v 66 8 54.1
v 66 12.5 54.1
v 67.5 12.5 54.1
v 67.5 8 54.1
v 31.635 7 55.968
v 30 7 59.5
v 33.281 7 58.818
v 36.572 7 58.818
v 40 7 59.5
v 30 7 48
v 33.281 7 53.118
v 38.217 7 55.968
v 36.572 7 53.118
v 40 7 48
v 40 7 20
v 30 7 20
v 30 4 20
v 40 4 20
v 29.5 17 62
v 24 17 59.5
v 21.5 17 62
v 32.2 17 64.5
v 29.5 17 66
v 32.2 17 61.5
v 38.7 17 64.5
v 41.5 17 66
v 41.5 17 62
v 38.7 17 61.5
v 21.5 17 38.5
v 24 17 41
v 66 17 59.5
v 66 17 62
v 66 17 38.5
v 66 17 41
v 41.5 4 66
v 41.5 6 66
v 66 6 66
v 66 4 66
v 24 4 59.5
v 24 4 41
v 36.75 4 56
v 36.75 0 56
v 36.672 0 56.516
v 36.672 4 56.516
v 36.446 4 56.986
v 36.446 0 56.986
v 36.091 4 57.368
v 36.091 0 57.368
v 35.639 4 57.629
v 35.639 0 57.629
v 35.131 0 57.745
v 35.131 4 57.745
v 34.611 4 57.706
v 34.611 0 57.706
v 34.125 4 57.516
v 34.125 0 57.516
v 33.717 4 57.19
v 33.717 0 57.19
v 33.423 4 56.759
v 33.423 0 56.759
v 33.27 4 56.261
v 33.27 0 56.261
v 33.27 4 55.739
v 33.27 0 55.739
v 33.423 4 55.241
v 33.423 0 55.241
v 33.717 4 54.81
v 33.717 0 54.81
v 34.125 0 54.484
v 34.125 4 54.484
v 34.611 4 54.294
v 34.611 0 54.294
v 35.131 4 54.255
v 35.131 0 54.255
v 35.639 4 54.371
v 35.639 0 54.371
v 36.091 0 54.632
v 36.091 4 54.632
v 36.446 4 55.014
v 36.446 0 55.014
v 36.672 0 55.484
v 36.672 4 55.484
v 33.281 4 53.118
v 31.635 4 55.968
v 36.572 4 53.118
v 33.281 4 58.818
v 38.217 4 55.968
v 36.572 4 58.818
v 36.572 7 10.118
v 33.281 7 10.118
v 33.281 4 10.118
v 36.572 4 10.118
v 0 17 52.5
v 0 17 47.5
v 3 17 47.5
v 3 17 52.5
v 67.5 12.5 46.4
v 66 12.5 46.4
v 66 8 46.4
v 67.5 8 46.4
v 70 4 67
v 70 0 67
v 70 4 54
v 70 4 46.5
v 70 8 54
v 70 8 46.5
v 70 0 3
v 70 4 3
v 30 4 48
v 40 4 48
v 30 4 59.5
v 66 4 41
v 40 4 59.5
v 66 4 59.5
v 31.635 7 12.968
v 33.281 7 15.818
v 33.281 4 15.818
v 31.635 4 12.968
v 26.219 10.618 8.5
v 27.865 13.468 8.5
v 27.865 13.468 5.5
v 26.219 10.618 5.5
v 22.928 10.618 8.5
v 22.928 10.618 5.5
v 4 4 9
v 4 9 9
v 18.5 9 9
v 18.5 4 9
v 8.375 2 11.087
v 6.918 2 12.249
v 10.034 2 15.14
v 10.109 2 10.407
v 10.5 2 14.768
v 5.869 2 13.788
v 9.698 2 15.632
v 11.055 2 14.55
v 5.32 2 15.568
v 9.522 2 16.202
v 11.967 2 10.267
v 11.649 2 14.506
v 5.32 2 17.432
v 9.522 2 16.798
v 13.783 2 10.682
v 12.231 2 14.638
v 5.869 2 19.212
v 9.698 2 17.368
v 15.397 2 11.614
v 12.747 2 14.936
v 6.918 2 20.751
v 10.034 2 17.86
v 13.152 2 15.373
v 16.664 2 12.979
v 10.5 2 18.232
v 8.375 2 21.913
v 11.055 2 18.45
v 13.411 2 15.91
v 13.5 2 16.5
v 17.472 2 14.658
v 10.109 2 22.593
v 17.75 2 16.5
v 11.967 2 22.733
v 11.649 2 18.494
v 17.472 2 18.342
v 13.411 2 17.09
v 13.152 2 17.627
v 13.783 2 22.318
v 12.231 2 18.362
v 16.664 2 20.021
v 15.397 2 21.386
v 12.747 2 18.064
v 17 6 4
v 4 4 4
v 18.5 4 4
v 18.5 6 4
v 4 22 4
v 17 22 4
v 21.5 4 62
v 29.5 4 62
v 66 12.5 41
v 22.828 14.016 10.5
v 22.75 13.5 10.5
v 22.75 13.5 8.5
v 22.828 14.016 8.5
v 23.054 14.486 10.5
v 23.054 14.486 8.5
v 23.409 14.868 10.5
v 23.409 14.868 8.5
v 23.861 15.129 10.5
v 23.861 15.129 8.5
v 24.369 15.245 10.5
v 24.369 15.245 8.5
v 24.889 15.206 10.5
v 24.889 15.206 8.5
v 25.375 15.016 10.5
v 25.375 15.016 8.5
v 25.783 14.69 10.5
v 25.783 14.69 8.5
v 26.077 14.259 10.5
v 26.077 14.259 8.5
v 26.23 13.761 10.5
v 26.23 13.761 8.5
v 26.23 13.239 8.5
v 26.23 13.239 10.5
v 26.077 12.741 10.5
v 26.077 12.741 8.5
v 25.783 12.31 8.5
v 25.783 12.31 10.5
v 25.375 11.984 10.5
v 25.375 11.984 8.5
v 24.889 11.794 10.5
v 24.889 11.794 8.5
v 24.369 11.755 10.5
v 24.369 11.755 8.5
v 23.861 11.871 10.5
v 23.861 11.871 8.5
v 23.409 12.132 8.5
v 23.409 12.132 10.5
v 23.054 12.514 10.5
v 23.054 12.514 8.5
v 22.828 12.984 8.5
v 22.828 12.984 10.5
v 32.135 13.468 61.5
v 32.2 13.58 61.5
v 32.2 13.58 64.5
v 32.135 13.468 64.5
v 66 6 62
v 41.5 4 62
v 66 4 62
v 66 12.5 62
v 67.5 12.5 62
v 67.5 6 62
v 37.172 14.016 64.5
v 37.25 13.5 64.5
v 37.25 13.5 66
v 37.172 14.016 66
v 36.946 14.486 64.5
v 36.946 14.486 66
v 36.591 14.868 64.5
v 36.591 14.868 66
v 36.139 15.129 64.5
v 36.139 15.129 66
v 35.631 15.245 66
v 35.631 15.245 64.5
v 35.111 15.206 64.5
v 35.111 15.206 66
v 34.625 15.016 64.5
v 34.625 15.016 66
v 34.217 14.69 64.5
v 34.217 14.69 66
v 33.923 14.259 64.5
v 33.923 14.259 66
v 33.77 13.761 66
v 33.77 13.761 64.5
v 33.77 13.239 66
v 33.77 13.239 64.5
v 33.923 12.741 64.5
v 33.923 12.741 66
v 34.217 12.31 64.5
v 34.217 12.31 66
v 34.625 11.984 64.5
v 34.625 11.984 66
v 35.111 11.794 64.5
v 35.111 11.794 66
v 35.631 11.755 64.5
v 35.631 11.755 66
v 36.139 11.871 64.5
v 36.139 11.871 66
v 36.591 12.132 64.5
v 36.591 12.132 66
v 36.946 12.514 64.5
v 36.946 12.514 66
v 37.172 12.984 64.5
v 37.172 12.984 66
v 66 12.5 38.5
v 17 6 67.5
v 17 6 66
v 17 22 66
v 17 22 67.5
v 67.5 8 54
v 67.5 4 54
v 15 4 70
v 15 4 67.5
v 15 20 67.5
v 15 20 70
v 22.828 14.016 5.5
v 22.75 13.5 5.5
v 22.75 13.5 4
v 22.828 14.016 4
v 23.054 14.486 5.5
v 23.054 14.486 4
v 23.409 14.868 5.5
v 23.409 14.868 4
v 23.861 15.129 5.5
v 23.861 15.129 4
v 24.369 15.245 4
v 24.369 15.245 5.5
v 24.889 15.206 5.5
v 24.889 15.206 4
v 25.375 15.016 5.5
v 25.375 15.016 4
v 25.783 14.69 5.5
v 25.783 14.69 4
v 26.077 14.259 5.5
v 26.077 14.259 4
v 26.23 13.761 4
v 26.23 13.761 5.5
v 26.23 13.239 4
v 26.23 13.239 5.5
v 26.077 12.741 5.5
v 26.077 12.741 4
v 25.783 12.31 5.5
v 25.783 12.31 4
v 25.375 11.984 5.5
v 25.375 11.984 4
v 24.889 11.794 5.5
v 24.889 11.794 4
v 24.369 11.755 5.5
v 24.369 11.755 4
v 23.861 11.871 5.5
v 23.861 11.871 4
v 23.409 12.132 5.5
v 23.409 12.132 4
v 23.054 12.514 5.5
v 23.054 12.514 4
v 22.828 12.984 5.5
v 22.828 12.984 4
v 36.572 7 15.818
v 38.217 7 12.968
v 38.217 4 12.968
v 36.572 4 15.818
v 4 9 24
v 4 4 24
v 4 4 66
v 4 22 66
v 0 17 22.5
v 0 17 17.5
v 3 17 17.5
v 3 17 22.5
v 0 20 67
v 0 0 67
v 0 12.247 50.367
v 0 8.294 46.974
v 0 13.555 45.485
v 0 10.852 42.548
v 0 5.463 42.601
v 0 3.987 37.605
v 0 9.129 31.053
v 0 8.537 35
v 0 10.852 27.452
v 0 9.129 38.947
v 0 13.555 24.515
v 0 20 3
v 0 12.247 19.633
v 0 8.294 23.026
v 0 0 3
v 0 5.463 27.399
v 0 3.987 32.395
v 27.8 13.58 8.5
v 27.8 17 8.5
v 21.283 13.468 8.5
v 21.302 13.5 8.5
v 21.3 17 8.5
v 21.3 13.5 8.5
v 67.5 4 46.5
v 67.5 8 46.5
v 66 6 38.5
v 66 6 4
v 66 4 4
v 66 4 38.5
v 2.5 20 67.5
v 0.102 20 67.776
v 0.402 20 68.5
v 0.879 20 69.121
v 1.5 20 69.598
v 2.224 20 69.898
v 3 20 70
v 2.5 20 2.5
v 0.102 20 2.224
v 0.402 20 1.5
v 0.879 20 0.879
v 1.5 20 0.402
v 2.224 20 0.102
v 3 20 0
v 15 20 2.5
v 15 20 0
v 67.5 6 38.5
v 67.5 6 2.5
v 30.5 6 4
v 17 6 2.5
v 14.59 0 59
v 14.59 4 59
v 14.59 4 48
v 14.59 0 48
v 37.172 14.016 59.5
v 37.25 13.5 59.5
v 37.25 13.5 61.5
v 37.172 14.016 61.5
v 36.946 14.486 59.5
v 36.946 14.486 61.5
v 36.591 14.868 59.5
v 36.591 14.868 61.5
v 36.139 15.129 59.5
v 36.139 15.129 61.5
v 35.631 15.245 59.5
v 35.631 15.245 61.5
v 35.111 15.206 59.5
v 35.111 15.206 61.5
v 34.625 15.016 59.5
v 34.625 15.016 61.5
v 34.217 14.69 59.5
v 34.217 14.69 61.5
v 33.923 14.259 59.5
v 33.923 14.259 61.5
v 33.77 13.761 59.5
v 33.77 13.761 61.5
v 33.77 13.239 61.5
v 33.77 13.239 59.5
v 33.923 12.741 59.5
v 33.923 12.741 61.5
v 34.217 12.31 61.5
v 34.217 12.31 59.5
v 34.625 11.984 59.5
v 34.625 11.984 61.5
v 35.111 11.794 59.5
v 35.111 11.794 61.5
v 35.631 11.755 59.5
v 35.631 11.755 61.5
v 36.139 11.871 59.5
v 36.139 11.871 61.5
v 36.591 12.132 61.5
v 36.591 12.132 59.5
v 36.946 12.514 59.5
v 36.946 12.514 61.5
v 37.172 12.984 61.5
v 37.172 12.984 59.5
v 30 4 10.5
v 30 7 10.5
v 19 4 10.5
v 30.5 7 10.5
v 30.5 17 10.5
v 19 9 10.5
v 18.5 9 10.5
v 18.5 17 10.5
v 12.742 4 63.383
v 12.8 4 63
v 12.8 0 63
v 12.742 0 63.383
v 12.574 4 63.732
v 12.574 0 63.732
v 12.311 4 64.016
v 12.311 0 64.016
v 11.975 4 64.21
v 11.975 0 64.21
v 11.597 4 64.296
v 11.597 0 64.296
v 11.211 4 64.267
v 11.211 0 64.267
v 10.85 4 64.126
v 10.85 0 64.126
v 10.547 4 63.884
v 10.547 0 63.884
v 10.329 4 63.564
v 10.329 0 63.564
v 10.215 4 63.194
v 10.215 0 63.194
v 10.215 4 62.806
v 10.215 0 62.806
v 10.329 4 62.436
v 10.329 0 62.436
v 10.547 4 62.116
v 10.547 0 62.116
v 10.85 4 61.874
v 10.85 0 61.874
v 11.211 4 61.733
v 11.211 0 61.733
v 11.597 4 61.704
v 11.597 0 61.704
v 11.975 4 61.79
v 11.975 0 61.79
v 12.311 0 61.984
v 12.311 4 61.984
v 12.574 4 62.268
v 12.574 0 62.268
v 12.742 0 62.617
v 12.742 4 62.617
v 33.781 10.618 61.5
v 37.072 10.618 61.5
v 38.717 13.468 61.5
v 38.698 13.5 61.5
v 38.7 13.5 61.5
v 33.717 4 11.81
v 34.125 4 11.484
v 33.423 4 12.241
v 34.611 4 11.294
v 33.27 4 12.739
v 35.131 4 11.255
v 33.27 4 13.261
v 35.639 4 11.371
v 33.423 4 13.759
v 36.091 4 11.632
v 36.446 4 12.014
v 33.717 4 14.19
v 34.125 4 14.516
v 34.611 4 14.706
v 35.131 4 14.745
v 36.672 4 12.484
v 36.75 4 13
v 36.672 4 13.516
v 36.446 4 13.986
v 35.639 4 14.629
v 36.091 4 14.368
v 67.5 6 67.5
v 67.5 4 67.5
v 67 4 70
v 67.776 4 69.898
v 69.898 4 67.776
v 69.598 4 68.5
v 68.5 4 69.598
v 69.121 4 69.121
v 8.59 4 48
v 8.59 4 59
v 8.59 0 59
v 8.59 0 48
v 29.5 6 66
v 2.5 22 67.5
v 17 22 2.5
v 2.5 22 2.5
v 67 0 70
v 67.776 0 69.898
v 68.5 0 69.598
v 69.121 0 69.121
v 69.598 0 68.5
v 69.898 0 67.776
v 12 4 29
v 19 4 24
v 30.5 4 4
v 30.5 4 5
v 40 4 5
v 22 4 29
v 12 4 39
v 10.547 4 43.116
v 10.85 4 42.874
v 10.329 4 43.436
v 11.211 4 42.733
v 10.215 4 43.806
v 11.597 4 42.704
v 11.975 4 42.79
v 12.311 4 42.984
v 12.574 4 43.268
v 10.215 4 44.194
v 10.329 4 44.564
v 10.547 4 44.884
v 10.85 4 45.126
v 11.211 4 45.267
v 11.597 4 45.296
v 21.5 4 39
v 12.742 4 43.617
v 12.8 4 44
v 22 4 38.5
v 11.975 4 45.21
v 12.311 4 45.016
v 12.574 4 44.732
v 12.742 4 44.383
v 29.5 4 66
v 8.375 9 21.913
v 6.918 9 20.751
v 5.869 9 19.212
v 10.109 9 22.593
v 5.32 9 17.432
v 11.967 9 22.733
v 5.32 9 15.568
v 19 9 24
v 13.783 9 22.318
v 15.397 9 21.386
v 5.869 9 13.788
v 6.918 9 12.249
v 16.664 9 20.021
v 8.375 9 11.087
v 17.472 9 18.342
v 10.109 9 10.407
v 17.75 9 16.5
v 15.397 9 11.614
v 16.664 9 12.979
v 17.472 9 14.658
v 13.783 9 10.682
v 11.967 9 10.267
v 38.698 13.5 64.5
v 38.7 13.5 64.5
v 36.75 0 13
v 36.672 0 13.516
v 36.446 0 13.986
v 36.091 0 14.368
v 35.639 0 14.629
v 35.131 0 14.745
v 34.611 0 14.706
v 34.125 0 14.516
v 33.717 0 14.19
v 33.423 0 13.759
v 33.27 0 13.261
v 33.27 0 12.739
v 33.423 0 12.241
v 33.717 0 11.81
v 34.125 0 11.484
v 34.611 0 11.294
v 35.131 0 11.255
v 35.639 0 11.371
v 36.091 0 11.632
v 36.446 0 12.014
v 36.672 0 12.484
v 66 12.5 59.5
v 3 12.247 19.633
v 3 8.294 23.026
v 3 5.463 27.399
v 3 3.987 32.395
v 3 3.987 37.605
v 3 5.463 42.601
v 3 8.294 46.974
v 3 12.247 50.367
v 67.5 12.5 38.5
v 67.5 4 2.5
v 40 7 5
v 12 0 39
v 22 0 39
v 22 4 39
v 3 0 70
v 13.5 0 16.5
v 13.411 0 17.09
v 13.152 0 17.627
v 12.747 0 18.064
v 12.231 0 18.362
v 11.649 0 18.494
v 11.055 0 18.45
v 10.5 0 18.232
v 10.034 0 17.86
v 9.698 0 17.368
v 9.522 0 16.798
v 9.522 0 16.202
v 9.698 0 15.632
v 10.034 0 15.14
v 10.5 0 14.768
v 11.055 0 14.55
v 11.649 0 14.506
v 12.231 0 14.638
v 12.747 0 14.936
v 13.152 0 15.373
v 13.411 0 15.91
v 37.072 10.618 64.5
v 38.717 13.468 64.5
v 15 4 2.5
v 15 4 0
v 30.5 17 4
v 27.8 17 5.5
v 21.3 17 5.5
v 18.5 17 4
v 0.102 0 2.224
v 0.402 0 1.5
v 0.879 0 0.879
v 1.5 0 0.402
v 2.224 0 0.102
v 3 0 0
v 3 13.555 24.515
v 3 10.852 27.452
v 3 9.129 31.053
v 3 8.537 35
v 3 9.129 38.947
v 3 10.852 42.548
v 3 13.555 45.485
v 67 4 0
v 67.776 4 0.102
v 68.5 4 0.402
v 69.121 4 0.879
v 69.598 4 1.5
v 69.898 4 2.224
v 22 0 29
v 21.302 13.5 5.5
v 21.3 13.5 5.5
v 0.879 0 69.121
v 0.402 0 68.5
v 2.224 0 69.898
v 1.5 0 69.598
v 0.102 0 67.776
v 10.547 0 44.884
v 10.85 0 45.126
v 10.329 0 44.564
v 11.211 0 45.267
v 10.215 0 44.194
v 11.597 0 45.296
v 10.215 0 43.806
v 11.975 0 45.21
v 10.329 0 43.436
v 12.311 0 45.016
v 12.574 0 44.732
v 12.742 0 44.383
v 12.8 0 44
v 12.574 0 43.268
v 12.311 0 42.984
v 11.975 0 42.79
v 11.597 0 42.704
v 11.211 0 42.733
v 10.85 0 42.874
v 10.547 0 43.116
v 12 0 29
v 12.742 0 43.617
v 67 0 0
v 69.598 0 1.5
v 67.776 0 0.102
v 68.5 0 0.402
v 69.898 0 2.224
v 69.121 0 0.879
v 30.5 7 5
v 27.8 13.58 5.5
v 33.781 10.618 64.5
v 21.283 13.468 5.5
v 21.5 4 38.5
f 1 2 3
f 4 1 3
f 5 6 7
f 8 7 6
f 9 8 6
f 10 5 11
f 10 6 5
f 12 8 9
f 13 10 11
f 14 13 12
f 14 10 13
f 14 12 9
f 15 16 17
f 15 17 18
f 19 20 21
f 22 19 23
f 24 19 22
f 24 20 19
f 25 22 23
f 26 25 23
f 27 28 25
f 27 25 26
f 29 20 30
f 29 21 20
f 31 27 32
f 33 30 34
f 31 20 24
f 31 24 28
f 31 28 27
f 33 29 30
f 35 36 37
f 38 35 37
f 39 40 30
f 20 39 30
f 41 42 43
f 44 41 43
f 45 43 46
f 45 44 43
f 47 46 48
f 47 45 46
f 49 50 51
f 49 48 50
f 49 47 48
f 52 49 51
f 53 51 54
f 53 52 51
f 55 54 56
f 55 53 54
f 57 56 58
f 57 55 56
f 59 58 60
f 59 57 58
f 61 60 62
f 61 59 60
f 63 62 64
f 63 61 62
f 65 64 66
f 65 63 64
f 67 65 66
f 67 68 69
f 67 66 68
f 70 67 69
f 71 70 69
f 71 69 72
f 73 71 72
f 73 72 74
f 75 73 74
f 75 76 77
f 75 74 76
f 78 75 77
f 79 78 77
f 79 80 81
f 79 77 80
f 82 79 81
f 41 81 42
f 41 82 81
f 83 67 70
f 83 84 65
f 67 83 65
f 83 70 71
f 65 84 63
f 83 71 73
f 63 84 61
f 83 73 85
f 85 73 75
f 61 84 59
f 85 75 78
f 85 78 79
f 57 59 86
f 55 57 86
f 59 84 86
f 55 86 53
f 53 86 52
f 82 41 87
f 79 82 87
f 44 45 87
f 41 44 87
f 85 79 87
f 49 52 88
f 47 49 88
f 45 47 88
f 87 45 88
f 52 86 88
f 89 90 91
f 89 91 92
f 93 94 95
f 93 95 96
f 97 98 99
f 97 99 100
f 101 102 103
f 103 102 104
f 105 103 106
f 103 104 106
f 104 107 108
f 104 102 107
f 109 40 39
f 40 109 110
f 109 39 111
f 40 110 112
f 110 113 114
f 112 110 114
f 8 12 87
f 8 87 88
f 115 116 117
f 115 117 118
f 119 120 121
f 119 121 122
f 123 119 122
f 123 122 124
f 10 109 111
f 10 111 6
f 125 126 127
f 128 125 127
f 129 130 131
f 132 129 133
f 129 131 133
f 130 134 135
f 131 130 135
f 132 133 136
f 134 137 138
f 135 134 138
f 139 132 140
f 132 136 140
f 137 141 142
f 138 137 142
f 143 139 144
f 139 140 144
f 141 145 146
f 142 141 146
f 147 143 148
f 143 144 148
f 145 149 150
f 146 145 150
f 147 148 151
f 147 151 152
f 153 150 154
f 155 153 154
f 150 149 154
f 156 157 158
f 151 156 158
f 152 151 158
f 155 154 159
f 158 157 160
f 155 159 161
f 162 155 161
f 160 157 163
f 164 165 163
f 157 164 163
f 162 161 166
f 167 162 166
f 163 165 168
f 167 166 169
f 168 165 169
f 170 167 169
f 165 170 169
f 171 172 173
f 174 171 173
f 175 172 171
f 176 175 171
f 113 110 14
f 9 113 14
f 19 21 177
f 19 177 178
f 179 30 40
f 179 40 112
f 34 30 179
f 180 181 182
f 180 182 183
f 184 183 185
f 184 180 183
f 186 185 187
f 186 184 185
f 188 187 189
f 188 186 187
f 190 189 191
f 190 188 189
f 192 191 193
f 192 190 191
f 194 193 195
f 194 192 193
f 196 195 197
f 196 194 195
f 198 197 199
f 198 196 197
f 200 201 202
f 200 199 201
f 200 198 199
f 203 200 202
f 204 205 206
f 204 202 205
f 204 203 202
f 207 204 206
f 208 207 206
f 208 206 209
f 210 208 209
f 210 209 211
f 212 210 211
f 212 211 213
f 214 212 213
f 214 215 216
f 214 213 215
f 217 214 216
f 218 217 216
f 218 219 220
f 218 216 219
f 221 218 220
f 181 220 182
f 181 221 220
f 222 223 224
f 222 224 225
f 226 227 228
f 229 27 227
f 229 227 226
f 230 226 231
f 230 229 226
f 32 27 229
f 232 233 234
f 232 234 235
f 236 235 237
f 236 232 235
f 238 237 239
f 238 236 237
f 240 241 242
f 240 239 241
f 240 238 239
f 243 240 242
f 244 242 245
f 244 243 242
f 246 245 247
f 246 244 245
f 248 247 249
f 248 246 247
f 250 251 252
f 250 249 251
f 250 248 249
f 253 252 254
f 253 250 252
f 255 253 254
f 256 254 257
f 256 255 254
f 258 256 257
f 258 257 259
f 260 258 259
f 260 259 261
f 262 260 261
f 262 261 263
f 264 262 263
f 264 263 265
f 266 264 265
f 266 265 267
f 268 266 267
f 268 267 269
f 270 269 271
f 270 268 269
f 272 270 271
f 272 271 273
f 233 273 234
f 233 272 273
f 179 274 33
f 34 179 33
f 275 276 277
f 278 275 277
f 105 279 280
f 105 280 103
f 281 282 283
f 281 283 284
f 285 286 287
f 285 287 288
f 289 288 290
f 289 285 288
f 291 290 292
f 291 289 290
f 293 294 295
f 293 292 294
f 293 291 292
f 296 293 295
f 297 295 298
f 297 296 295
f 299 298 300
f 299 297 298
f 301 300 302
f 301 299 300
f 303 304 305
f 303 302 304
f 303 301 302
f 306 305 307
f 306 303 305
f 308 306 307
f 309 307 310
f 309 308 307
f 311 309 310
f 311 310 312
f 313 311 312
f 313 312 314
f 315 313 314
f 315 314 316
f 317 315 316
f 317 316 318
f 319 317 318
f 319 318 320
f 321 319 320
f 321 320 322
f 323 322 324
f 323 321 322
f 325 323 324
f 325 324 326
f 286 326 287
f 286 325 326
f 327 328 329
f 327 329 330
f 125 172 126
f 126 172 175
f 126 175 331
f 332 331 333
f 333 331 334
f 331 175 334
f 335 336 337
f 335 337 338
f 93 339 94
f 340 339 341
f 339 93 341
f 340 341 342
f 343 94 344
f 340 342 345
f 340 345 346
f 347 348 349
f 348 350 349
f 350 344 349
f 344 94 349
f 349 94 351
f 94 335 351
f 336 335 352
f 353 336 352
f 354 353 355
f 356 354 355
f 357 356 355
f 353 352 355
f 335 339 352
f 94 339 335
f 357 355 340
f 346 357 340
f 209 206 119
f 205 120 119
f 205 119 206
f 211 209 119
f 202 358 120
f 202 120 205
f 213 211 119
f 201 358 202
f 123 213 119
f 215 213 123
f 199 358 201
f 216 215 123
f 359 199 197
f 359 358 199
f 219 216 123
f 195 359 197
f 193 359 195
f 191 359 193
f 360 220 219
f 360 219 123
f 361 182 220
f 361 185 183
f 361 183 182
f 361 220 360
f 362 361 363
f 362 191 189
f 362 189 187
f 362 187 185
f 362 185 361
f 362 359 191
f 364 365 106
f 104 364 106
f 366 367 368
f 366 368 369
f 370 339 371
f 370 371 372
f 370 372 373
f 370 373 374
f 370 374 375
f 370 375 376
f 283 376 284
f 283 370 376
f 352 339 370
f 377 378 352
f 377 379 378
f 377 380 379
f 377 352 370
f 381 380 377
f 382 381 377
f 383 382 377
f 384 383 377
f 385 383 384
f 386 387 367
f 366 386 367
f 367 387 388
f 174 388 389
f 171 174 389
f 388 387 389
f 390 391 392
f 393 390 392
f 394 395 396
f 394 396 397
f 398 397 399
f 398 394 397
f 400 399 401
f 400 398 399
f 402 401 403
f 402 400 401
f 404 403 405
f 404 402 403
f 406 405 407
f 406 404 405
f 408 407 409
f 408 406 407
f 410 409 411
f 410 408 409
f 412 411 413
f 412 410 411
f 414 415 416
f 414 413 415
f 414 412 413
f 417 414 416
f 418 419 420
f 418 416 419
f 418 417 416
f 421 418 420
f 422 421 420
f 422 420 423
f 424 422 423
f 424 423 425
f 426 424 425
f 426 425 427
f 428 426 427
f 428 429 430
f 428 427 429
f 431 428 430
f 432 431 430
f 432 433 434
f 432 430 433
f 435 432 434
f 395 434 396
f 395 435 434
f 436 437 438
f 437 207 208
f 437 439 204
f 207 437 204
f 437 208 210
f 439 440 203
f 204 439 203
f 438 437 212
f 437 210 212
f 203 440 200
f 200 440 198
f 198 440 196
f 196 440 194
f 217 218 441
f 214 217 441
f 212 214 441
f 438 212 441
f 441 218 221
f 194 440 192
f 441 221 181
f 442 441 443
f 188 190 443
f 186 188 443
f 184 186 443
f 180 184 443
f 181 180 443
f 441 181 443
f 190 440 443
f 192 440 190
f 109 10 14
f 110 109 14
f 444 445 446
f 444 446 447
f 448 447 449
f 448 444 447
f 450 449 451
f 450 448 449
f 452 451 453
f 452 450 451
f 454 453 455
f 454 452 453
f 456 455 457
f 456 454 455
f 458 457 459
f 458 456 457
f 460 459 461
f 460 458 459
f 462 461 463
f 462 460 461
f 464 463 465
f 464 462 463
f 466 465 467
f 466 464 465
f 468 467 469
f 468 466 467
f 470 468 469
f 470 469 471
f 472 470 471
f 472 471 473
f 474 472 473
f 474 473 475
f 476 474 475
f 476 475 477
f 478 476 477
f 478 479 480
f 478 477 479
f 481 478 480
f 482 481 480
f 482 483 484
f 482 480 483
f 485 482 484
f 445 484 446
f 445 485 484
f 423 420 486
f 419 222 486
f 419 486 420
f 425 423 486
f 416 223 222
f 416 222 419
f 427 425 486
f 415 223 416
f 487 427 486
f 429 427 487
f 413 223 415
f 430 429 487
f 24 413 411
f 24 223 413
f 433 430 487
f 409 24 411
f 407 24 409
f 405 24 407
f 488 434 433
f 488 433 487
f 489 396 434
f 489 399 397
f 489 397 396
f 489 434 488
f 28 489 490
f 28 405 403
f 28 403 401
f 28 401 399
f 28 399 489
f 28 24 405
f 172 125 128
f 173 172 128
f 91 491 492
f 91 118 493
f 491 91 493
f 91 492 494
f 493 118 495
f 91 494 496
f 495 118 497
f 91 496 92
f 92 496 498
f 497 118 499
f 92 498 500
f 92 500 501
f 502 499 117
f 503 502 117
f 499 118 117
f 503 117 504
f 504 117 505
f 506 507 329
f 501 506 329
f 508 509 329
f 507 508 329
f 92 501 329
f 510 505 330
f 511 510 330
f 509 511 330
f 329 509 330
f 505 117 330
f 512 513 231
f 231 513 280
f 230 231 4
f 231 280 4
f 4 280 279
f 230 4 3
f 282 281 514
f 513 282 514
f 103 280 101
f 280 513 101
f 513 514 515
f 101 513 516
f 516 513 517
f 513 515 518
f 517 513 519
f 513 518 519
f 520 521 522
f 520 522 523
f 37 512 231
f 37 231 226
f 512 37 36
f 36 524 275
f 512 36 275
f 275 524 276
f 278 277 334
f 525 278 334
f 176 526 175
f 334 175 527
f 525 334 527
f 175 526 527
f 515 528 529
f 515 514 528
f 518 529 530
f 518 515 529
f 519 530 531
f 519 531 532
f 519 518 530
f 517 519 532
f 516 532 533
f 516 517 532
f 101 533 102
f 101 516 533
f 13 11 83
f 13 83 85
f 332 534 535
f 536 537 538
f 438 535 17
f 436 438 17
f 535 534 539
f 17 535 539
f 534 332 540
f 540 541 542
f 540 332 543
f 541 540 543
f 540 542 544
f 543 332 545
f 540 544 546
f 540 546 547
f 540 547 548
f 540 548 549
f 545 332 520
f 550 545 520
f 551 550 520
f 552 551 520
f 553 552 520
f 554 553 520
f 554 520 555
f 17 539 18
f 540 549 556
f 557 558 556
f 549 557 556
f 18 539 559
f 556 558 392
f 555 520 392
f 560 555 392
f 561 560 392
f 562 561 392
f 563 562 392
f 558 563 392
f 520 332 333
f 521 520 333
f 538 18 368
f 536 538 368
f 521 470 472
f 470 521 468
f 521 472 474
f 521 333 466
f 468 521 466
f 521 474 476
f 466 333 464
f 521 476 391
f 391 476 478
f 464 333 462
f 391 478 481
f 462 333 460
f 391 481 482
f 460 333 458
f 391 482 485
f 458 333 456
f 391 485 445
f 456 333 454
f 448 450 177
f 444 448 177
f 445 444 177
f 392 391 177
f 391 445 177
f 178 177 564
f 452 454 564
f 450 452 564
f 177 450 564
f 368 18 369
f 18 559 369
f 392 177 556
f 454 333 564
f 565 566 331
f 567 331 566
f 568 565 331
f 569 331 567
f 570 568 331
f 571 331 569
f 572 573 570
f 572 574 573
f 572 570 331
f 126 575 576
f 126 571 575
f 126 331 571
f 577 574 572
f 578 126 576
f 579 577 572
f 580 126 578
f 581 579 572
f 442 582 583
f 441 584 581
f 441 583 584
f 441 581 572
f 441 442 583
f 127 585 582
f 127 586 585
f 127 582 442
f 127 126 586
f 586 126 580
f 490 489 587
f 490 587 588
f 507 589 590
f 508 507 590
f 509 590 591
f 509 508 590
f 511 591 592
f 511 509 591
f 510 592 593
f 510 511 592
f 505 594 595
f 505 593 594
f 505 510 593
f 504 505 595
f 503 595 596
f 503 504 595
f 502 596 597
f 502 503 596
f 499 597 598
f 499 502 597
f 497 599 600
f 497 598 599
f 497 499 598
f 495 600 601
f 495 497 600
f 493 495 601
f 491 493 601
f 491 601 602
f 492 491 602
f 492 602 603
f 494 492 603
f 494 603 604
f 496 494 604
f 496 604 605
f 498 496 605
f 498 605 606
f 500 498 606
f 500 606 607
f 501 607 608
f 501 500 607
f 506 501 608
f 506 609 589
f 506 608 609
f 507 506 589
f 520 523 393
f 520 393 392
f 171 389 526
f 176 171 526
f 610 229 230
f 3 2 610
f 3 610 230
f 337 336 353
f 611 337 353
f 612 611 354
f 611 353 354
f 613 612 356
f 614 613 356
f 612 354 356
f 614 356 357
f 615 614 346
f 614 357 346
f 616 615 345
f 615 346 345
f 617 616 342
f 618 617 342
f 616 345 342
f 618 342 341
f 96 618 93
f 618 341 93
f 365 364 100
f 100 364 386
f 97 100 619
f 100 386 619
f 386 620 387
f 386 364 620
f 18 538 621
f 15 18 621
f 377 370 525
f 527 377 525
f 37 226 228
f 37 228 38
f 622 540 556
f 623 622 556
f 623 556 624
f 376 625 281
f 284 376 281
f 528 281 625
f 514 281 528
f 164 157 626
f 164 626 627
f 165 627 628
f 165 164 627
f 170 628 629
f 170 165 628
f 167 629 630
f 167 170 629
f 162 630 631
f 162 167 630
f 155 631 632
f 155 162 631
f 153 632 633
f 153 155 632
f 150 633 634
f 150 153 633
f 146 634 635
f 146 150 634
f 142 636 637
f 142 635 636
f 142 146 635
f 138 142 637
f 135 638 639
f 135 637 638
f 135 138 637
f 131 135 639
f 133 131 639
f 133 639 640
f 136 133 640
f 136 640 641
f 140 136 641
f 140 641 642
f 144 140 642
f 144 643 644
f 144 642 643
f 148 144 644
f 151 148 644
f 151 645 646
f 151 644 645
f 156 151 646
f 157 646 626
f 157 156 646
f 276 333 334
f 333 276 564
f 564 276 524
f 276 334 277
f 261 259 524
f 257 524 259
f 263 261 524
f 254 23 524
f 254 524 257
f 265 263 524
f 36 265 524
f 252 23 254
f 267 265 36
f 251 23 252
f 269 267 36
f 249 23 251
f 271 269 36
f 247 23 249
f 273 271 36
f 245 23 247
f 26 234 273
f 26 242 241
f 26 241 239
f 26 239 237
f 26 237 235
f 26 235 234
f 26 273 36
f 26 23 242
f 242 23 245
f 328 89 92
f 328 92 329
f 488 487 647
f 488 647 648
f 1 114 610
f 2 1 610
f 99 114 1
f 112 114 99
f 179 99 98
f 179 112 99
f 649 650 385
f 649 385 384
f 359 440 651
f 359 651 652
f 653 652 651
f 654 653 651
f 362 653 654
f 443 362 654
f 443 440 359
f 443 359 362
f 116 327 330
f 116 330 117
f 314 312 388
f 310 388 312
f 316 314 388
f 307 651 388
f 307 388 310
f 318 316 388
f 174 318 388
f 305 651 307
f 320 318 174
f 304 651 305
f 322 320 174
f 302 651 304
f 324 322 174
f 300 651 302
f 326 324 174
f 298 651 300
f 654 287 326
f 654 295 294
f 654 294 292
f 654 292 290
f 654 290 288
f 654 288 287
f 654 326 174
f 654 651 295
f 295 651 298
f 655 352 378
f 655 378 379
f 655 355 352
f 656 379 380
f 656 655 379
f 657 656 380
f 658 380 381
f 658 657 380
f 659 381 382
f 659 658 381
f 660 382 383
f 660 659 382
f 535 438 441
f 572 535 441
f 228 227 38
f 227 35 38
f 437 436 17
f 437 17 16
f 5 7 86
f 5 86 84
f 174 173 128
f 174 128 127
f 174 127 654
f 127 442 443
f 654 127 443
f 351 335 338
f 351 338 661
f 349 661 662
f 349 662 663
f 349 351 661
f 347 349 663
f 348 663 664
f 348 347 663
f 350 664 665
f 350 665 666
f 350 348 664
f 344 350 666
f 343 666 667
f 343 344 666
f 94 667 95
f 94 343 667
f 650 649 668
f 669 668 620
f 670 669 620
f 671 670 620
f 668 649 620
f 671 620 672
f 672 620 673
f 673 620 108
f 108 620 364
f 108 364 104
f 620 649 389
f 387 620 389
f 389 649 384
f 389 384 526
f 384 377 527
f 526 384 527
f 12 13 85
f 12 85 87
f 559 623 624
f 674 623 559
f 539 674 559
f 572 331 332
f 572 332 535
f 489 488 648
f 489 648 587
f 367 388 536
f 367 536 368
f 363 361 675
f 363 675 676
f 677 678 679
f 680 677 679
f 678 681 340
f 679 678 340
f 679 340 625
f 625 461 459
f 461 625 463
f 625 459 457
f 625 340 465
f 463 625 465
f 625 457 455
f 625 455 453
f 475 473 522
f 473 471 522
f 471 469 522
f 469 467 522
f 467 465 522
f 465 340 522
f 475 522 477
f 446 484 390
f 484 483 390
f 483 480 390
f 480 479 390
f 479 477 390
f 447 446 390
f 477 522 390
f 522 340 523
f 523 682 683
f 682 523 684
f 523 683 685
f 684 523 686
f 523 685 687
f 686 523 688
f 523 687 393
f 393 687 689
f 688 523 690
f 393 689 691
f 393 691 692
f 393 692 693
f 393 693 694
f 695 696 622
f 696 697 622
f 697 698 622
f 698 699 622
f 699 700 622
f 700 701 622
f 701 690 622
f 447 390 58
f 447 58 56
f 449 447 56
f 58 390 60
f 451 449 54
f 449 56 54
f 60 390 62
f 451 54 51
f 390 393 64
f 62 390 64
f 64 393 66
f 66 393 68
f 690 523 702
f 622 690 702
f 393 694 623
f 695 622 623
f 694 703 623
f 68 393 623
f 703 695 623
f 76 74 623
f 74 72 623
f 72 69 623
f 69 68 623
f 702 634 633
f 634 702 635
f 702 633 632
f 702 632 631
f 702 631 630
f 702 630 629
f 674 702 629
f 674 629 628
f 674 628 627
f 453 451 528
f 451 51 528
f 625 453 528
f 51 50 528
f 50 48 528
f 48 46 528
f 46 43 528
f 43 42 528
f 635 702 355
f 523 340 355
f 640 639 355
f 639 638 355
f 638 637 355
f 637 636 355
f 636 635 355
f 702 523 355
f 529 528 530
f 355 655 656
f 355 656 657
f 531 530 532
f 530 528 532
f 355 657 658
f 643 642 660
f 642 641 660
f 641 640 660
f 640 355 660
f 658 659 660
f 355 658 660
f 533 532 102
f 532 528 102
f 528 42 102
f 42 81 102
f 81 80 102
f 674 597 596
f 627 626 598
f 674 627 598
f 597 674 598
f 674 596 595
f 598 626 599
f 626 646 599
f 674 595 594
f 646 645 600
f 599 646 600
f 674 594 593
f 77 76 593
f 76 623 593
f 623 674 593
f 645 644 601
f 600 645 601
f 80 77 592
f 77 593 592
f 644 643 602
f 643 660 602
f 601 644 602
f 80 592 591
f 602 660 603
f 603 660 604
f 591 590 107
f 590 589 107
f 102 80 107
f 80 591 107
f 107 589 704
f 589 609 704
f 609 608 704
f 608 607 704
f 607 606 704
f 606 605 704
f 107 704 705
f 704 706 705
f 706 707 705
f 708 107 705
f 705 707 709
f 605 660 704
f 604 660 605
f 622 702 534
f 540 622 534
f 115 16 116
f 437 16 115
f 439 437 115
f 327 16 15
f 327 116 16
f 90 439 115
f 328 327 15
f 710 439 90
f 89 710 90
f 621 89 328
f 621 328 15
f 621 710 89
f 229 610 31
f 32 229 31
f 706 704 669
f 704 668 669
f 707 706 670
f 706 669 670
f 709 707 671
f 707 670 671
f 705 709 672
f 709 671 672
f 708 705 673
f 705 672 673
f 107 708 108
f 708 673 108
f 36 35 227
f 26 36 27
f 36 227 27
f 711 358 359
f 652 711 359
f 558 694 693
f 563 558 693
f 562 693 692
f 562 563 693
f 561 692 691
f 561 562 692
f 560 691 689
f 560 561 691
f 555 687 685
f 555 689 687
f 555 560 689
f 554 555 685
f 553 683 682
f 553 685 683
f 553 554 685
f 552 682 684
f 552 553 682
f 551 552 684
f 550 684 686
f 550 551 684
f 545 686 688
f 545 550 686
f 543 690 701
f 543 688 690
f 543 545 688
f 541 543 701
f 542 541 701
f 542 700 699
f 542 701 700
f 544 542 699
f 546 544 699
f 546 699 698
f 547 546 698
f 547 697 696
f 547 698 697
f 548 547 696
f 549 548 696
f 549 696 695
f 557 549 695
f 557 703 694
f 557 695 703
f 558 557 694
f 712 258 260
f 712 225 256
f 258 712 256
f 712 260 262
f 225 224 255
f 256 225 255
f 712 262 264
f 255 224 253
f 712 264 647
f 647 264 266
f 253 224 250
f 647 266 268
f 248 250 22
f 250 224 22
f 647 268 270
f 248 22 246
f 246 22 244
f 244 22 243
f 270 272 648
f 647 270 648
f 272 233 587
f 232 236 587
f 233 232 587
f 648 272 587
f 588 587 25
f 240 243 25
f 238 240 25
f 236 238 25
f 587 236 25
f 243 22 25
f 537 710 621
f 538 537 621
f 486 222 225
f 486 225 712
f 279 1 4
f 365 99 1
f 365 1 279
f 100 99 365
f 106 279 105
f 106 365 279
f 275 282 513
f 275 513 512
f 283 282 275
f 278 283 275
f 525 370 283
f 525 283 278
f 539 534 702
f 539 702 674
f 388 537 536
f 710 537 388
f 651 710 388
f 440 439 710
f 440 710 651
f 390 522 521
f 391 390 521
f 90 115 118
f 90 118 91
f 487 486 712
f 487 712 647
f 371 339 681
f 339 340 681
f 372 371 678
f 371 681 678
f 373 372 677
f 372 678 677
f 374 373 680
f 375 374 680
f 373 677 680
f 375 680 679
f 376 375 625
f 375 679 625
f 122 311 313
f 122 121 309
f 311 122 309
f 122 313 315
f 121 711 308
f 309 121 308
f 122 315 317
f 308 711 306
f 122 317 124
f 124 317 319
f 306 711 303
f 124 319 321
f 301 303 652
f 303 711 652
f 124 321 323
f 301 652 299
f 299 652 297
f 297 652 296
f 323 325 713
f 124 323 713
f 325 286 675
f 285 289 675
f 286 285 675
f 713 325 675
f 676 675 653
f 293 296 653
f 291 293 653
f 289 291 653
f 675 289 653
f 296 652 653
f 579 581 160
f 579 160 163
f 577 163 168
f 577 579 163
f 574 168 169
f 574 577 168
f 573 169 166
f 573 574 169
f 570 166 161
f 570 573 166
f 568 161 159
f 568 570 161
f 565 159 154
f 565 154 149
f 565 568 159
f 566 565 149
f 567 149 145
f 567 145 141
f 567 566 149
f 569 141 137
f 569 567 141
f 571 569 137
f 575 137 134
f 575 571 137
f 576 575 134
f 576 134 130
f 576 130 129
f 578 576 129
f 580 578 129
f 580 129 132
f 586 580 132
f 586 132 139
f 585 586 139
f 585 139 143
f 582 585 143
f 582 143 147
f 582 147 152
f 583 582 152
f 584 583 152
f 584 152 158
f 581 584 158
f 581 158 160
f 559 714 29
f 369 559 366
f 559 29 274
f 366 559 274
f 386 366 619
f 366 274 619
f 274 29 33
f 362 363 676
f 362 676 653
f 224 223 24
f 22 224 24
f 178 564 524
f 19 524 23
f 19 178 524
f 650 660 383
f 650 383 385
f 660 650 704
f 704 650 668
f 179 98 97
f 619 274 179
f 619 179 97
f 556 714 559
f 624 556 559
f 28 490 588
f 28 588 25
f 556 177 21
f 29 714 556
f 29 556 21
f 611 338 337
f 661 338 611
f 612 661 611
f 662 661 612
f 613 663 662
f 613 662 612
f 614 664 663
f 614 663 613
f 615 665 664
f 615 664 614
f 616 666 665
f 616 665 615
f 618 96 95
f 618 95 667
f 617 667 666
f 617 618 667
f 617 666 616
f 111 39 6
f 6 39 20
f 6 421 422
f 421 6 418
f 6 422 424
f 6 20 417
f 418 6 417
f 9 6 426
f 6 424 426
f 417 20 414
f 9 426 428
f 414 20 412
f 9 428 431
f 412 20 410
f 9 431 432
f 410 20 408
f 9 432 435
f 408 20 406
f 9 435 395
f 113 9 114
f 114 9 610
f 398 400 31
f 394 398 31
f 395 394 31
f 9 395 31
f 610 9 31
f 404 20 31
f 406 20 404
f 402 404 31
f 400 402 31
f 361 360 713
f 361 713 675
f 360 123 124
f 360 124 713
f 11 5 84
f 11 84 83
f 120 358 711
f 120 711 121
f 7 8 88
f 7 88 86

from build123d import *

# Parameters (mm, degrees)
BOX071_W               = 10
BOX071_H               = 4.5
BOX071_DEPTH           = 7.7
BOX070_W               = 1.5
BOX070_H               = 6.5
BOX070_DEPTH           = 23.5
BOX072_W               = 2.5
BOX072_H               = 4
BOX072_DEPTH           = 7.5
CYLINDER040_R          = 1.3
CYLINDER040_DEPTH      = 10
CYLINDER040_ROLL_ANGLE = 90
CYLINDER039_R          = 1.3
CYLINDER039_DEPTH      = 10
CYLINDER039_ROLL_ANGLE = 90
BOX068_W               = 11
BOX068_H               = 10
BOX068_DEPTH           = 6
BOX068_PITCH_ANGLE     = 90
CYLINDER037_R          = 6.25
CYLINDER037_DEPTH      = 10
CYLINDER037_ROLL_ANGLE = 90
CYLINDER038_R          = 2
CYLINDER038_DEPTH      = 10
CYLINDER038_ROLL_ANGLE = 90
BOX059_W               = 2.5
BOX059_H               = 13
BOX059_DEPTH           = 23.5
BOX060_W               = 44
BOX060_H               = 13
BOX060_DEPTH           = 2.5
BOX061_W               = 7.5
BOX061_H               = 13
BOX061_DEPTH           = 2.5
BOX062_W               = 24.5
BOX062_H               = 13
BOX062_DEPTH           = 2.5
BOX056_W               = 10
BOX056_H               = 20
BOX056_DEPTH           = 10
CYLINDER032_R          = 1.75
CYLINDER032_DEPTH      = 10
BOX055_W               = 6.5
BOX055_H               = 10
BOX055_DEPTH           = 3
PAD011_DEPTH           = 3
BOX053_W               = 12
BOX053_H               = 13
BOX053_DEPTH           = 6.5
CUT068_PLACEMENT_ANGLE = 180
CYLINDER019_R          = 1.75
CYLINDER019_DEPTH      = 20
CYLINDER019_ROLL_ANGLE = 90
CYLINDER020_R          = 1.75
CYLINDER020_DEPTH      = 20
CYLINDER020_ROLL_ANGLE = 90
BOX019_W               = 2.5
BOX019_H               = 2
BOX019_DEPTH           = 12.5
BOX019_PITCH_ANGLE     = 90
BOX018_W               = 2
BOX018_H               = 2.5
BOX018_DEPTH           = 18
BOX018_ROLL_ANGLE      = 90
BOX017_W               = 2.5
BOX017_H               = 2
BOX017_DEPTH           = 50.5
BOX017_PITCH_ANGLE     = 90
BOX016_W               = 2.5
BOX016_H               = 2
BOX016_DEPTH           = 12.5
BOX016_PITCH_ANGLE     = 90
BOX015_W               = 2
BOX015_H               = 2.5
BOX015_DEPTH           = 18
BOX015_ROLL_ANGLE      = 90
BOX014_W               = 2.5
BOX014_H               = 2
BOX014_DEPTH           = 50.5
BOX014_PITCH_ANGLE     = 90
BOX013_W               = 2.5
BOX013_H               = 2
BOX013_DEPTH           = 70
BOX012_W               = 2.5
BOX012_H               = 2
BOX012_DEPTH           = 70
BOX011_W               = 62
BOX011_H               = 62
BOX011_DEPTH           = 25
BOX011_ROLL_ANGLE      = 90
PAD004_DEPTH           = 70
POCKET002003_DEPTH     = 3
FILLET001_R            = 3
PAD007_DEPTH           = 3
BOX039_W               = 10
BOX039_H               = 3
BOX039_DEPTH           = 15
BOX067_W               = 15
BOX067_H               = 5
BOX067_DEPTH           = 15


with BuildPart() as cube070:
    # Box071 → Box071 (new body)
    with BuildSketch(Plane(origin=(60, 8, 46.4), x_dir=(1, 0, 0), z_dir=(0, 0, 1))):
        with Locations((5, 2.25)):
            Rectangle(BOX071_W, BOX071_H)
    extrude(amount=BOX071_DEPTH)


with BuildPart() as cut084:
    # Box070 → Box070 (new body)
    with BuildSketch(Plane(origin=(66, 6, 38.5), x_dir=(1, 0, 0), z_dir=(0, 0, 1))):
        with Locations((0.75, 3.25)):
            Rectangle(BOX070_W, BOX070_H)
    extrude(amount=BOX070_DEPTH)

    # Cut084: cut Cube070
    add(cube070.part, mode=Mode.SUBTRACT)


with BuildPart() as cube071:
    # Box072 → Box072 (new body)
    with BuildSketch(Plane(origin=(67.5, 4, 46.5), x_dir=(1, 0, 0), z_dir=(0, 0, 1))):
        with Locations((1.25, 2)):
            Rectangle(BOX072_W, BOX072_H)
    extrude(amount=BOX072_DEPTH)


with BuildPart() as cylinder072:
    # Cylinder040 → Cylinder040 (new body)
    with BuildSketch(Plane.XY):
        Circle(CYLINDER040_R)
    extrude(amount=CYLINDER040_DEPTH)


with BuildPart() as cylinder072_1:
    # Cylinder040 roll: moved
    add(cylinder072.part.rotate(Axis((0, 0, 0), (1, 0, 0)), CYLINDER040_ROLL_ANGLE))


with BuildPart() as cylinder072_2:
    # Cylinder040 placement: moved
    add(cylinder072_1.part.moved(Location((11.5, 7, 44))))


with BuildPart() as cylinder071:
    # Cylinder039 → Cylinder039 (new body)
    with BuildSketch(Plane.XY):
        Circle(CYLINDER039_R)
    extrude(amount=CYLINDER039_DEPTH)


with BuildPart() as cylinder071_1:
    # Cylinder039 roll: moved
    add(cylinder071.part.rotate(Axis((0, 0, 0), (1, 0, 0)), CYLINDER039_ROLL_ANGLE))


with BuildPart() as cylinder071_2:
    # Cylinder039 placement: moved
    add(cylinder071_1.part.moved(Location((11.5, 7, 63))))


with BuildPart() as cube067:
    # Box068 → Box068 (new body)
    with BuildSketch(Plane.XY):
        with Locations((5.5, 5)):
            Rectangle(BOX068_W, BOX068_H)
    extrude(amount=BOX068_DEPTH)


with BuildPart() as cube067_1:
    # Box068 pitch: moved
    add(cube067.part.rotate(Axis((0, 0, 0), (0, 1, 0)), BOX068_PITCH_ANGLE))


with BuildPart() as cube067_2:
    # Box068 placement: moved
    add(cube067_1.part.moved(Location((8.59, -3, 59))))


with BuildPart() as cylinder069:
    # Cylinder037 → Cylinder037 (new body)
    with BuildSketch(Plane.XY):
        Circle(CYLINDER037_R)
    extrude(amount=CYLINDER037_DEPTH)


with BuildPart() as cylinder069_1:
    # Cylinder037 roll: moved
    add(cylinder069.part.rotate(Axis((0, 0, 0), (1, 0, 0)), CYLINDER037_ROLL_ANGLE))


with BuildPart() as cylinder069_2:
    # Cylinder037 placement: moved
    add(cylinder069_1.part.moved(Location((11.5, 12, 16.5))))


with BuildPart() as cylinder070:
    # Cylinder038 → Cylinder038 (new body)
    with BuildSketch(Plane.XY):
        Circle(CYLINDER038_R)
    extrude(amount=CYLINDER038_DEPTH)


with BuildPart() as cylinder070_1:
    # Cylinder038 roll: moved
    add(cylinder070.part.rotate(Axis((0, 0, 0), (1, 0, 0)), CYLINDER038_ROLL_ANGLE))


with BuildPart() as cylinder070_2:
    # Cylinder038 placement: moved
    add(cylinder070_1.part.moved(Location((11.5, 7, 16.5))))


with BuildPart() as cube058:
    # Box059 → Box059 (new body)
    with BuildSketch(Plane(origin=(21.5, 4, 38.5), x_dir=(1, 0, 0), z_dir=(0, 0, 1))):
        with Locations((1.25, 6.5)):
            Rectangle(BOX059_W, BOX059_H)
    extrude(amount=BOX059_DEPTH)


with BuildPart() as cube059:
    # Box060 → Box060 (new body)
    with BuildSketch(Plane(origin=(22, 4, 38.5), x_dir=(1, 0, 0), z_dir=(0, 0, 1))):
        with Locations((22, 6.5)):
            Rectangle(BOX060_W, BOX060_H)
    extrude(amount=BOX060_DEPTH)


with BuildPart() as cube060:
    # Box061 → Box061 (new body)
    with BuildSketch(Plane(origin=(22, 4, 59.5), x_dir=(1, 0, 0), z_dir=(0, 0, 1))):
        with Locations((3.75, 6.5)):
            Rectangle(BOX061_W, BOX061_H)
    extrude(amount=BOX061_DEPTH)


with BuildPart() as cube061:
    # Box062 → Box062 (new body)
    with BuildSketch(Plane(origin=(41.5, 4, 59.5), x_dir=(1, 0, 0), z_dir=(0, 0, 1))):
        with Locations((12.25, 6.5)):
            Rectangle(BOX062_W, BOX062_H)
    extrude(amount=BOX062_DEPTH)


with BuildPart() as cube055:
    # Box056 → Box056 (new body)
    with BuildSketch(Plane(origin=(12, -7, 29), x_dir=(1, 0, 0), z_dir=(0, 0, 1))):
        with Locations((5, 10)):
            Rectangle(BOX056_W, BOX056_H)
    extrude(amount=BOX056_DEPTH)


with BuildPart() as cylinder064:
    # Cylinder032 → Cylinder032 (new body)
    with BuildSketch(Plane(origin=(35.5, 13.5, 59), x_dir=(1, 0, 0), z_dir=(0, 0, 1))):
        Circle(CYLINDER032_R)
    extrude(amount=CYLINDER032_DEPTH)


with BuildPart() as cube054:
    # Box055 → Box055 (new body)
    with BuildSketch(Plane(origin=(32.2, 13.5, 61.5), x_dir=(1, 0, 0), z_dir=(0, 0, 1))):
        with Locations((3.25, 5)):
            Rectangle(BOX055_W, BOX055_H)
    extrude(amount=BOX055_DEPTH)


with BuildPart() as pad011:
    # Sketch017 → Pad011 (new body)
    with BuildSketch(Plane(origin=(-5.5, 2, 61.5), x_dir=(1, 0, 0), z_dir=(0, 0, 1))):
        Polygon((42.571507, 14.317564), (39.28061, 14.317564), (37.635162, 11.467564), (39.28061, 8.617564), (42.571507, 8.617564), (44.216955, 11.467564), align=None)
    extrude(amount=PAD011_DEPTH)


with BuildPart() as cut067:
    # Box053 → Box053 (new body)
    with BuildSketch(Plane(origin=(29.5, 4, 59.5), x_dir=(1, 0, 0), z_dir=(0, 0, 1))):
        with Locations((6, 6.5)):
            Rectangle(BOX053_W, BOX053_H)
    extrude(amount=BOX053_DEPTH)

    # Cut066: cut Pad011
    add(pad011.part, mode=Mode.SUBTRACT)

    # Cut067: cut Cube054
    add(cube054.part, mode=Mode.SUBTRACT)


with BuildPart() as cut068:
    # Cut068 base: copy of Cut067
    add(cut067.part)

    # Cut068: cut Cylinder064
    add(cylinder064.part, mode=Mode.SUBTRACT)


with BuildPart() as cut068_1:
    # Cut068 placement: moved
    add(cut068.part.moved(Location((60, 0, 70))).rotate(Axis((60, 0, 70), (0, 1, 0)), CUT068_PLACEMENT_ANGLE))


with BuildPart() as cut069:
    # Cut069 base: copy of Cut067
    add(cut067.part)

    # Cut069: cut Cylinder064
    add(cylinder064.part, mode=Mode.SUBTRACT)


with BuildPart() as cylinder054:
    # Cylinder019 → Cylinder019 (new body)
    with BuildSketch(Plane.XY):
        Circle(CYLINDER019_R)
    extrude(amount=CYLINDER019_DEPTH)


with BuildPart() as cylinder054_1:
    # Cylinder019 roll: moved
    add(cylinder054.part.rotate(Axis((0, 0, 0), (1, 0, 0)), CYLINDER019_ROLL_ANGLE))


with BuildPart() as cylinder054_2:
    # Cylinder019 placement: moved
    add(cylinder054_1.part.moved(Location((35, 10, 56))))


with BuildPart() as cylinder055:
    # Cylinder020 → Cylinder020 (new body)
    with BuildSketch(Plane.XY):
        Circle(CYLINDER020_R)
    extrude(amount=CYLINDER020_DEPTH)


with BuildPart() as cylinder055_1:
    # Cylinder020 roll: moved
    add(cylinder055.part.rotate(Axis((0, 0, 0), (1, 0, 0)), CYLINDER020_ROLL_ANGLE))


with BuildPart() as cylinder055_2:
    # Cylinder020 placement: moved
    add(cylinder055_1.part.moved(Location((35, 10, 13))))


with BuildPart() as cube019:
    # Box019 → Box019 (new body)
    with BuildSketch(Plane.XY):
        with Locations((1.25, 1)):
            Rectangle(BOX019_W, BOX019_H)
    extrude(amount=BOX019_DEPTH)


with BuildPart() as cube019_1:
    # Box019 pitch: moved
    add(cube019.part.rotate(Axis((0, 0, 0), (0, 1, 0)), BOX019_PITCH_ANGLE))


with BuildPart() as cube019_2:
    # Box019 placement: moved
    add(cube019_1.part.moved(Location((2.5, 20, 2.5))))


with BuildPart() as cube018:
    # Box018 → Box018 (new body)
    with BuildSketch(Plane.XY):
        with Locations((1, 1.25)):
            Rectangle(BOX018_W, BOX018_H)
    extrude(amount=BOX018_DEPTH)


with BuildPart() as cube018_1:
    # Box018 roll: moved
    add(cube018.part.rotate(Axis((0, 0, 0), (1, 0, 0)), BOX018_ROLL_ANGLE))


with BuildPart() as cube018_2:
    # Box018 placement: moved
    add(cube018_1.part.moved(Location((15, 22, 0))))


with BuildPart() as cube017:
    # Box017 → Box017 (new body)
    with BuildSketch(Plane.XY):
        with Locations((1.25, 1)):
            Rectangle(BOX017_W, BOX017_H)
    extrude(amount=BOX017_DEPTH)


with BuildPart() as cube017_1:
    # Box017 pitch: moved
    add(cube017.part.rotate(Axis((0, 0, 0), (0, 1, 0)), BOX017_PITCH_ANGLE))


with BuildPart() as cube017_2:
    # Box017 placement: moved
    add(cube017_1.part.moved(Location((17, 4, 2.5))))


with BuildPart() as cube016:
    # Box016 → Box016 (new body)
    with BuildSketch(Plane.XY):
        with Locations((1.25, 1)):
            Rectangle(BOX016_W, BOX016_H)
    extrude(amount=BOX016_DEPTH)


with BuildPart() as cube016_1:
    # Box016 pitch: moved
    add(cube016.part.rotate(Axis((0, 0, 0), (0, 1, 0)), BOX016_PITCH_ANGLE))


with BuildPart() as cube016_2:
    # Box016 placement: moved
    add(cube016_1.part.moved(Location((2.5, 20, 70))))


with BuildPart() as cube015:
    # Box015 → Box015 (new body)
    with BuildSketch(Plane.XY):
        with Locations((1, 1.25)):
            Rectangle(BOX015_W, BOX015_H)
    extrude(amount=BOX015_DEPTH)


with BuildPart() as cube015_1:
    # Box015 roll: moved
    add(cube015.part.rotate(Axis((0, 0, 0), (1, 0, 0)), BOX015_ROLL_ANGLE))


with BuildPart() as cube015_2:
    # Box015 placement: moved
    add(cube015_1.part.moved(Location((15, 22, 67.5))))


with BuildPart() as cube014:
    # Box014 → Box014 (new body)
    with BuildSketch(Plane.XY):
        with Locations((1.25, 1)):
            Rectangle(BOX014_W, BOX014_H)
    extrude(amount=BOX014_DEPTH)


with BuildPart() as cube014_1:
    # Box014 pitch: moved
    add(cube014.part.rotate(Axis((0, 0, 0), (0, 1, 0)), BOX014_PITCH_ANGLE))


with BuildPart() as cube014_2:
    # Box014 placement: moved
    add(cube014_1.part.moved(Location((17, 4, 70))))


with BuildPart() as cube013:
    # Box013 → Box013 (new body)
    with BuildSketch(Plane(origin=(67.5, 4, 0), x_dir=(1, 0, 0), z_dir=(0, 0, 1))):
        with Locations((1.25, 1)):
            Rectangle(BOX013_W, BOX013_H)
    extrude(amount=BOX013_DEPTH)


with BuildPart() as cube012:
    # Box012 → Box012 (new body)
    with BuildSketch(Plane(origin=(0, 20, 0), x_dir=(1, 0, 0), z_dir=(0, 0, 1))):
        with Locations((1.25, 1)):
            Rectangle(BOX012_W, BOX012_H)
    extrude(amount=BOX012_DEPTH)


with BuildPart() as cube011:
    # Box011 → Box011 (new body)
    with BuildSketch(Plane.XY):
        with Locations((31, 31)):
            Rectangle(BOX011_W, BOX011_H)
    extrude(amount=BOX011_DEPTH)


with BuildPart() as cube011_1:
    # Box011 roll: moved
    add(cube011.part.rotate(Axis((0, 0, 0), (1, 0, 0)), BOX011_ROLL_ANGLE))


with BuildPart() as cube011_2:
    # Box011 placement: moved
    add(cube011_1.part.moved(Location((4, 29, 4))))


with BuildPart() as fillet001:
    # Sketch007 → Pad004 (new body)
    with BuildSketch(Plane.XY):
        Polygon((0, 22), (0, 0), (70, 0), (70, 6), (17, 6), (17, 22), align=None)
    extrude(amount=PAD004_DEPTH)

    # Cut015: cut Cube011
    add(cube011_2.part, mode=Mode.SUBTRACT)

    # Cut016: cut Cube012
    add(cube012.part, mode=Mode.SUBTRACT)

    # Cut017: cut Cube013
    add(cube013.part, mode=Mode.SUBTRACT)

    # Cut018: cut Cube014
    add(cube014_2.part, mode=Mode.SUBTRACT)

    # Cut019: cut Cube015
    add(cube015_2.part, mode=Mode.SUBTRACT)

    # Cut020: cut Cube016
    add(cube016_2.part, mode=Mode.SUBTRACT)

    # Cut021: cut Cube017
    add(cube017_2.part, mode=Mode.SUBTRACT)

    # Cut022: cut Cube018
    add(cube018_2.part, mode=Mode.SUBTRACT)

    # Cut023: cut Cube019
    add(cube019_2.part, mode=Mode.SUBTRACT)

    # Sketch008 → Pocket002003 (cut)
    with BuildSketch(Plane(origin=(0, 0, 0), x_dir=(0, -1, 0), z_dir=(-1, 0, 0))):
        with BuildLine():
            ThreePointArc((-17, 17.5), (-3.799725, 35), (-17, 52.5))
            Line((-17, 47.5), (-17, 52.5))
            ThreePointArc((-17, 22.5), (-8.537088, 35), (-17, 47.5))
            Line((-17, 17.5), (-17, 22.5))
        make_face()
    extrude(amount=-POCKET002003_DEPTH, mode=Mode.SUBTRACT)

    # Fillet001
    fillet001_edges = [fillet001.edges().sort_by_distance(p)[0] for p in [
        (0, 10, 0),
        (0, 10, 70),
        (70, 2, 0),
        (70, 2, 70),
    ]]
    fillet(fillet001_edges, radius=FILLET001_R)


with BuildPart() as pad007:
    # Sketch013 → Pad007 (new body)
    with BuildSketch(Plane(origin=(-6, 7, 1.5), x_dir=(1, 0, 0), z_dir=(0, -1, 0))):
        Polygon((42.571507, 14.317564), (39.28061, 14.317564), (37.635162, 11.467564), (39.28061, 8.617564), (42.571507, 8.617564), (44.216955, 11.467564), align=None)
    extrude(amount=PAD007_DEPTH)


with BuildPart() as cube038:
    # Box039 → Box039 (new body)
    with BuildSketch(Plane(origin=(30, 4, 5), x_dir=(1, 0, 0), z_dir=(0, 0, 1))):
        with Locations((5, 1.5)):
            Rectangle(BOX039_W, BOX039_H)
    extrude(amount=BOX039_DEPTH)


with BuildPart() as cut054:
    # Cut054 base: copy of Cube038
    add(cube038.part)

    # Cut054: cut Pad007
    add(pad007.part, mode=Mode.SUBTRACT)


with BuildPart() as cut079:
    # Cut053 base: copy of Cube038
    add(cube038.part)

    # Cut053: cut Pad007
    add(pad007.part, mode=Mode.SUBTRACT)


with BuildPart() as cut079_1:
    # Cut053 placement: moved
    add(cut079.part.moved(Location((0, 0, 43))))

    # Fusion008: union Fillet001, Cut054
    add(fillet001.part)
    add(cut054.part)

    # Cut055: cut Cylinder055
    add(cylinder055_2.part, mode=Mode.SUBTRACT)

    # Cut056: cut Cylinder054
    add(cylinder054_2.part, mode=Mode.SUBTRACT)

    # Fusion016: union Cut068, Cut069
    add(cut068_1.part)
    add(cut069.part)

    # Cut074: cut Cube055
    add(cube055.part, mode=Mode.SUBTRACT)

    # Fusion018: union Cube058, Cube059, Cube060, Cube061
    add(cube058.part)
    add(cube059.part)
    add(cube060.part)
    add(cube061.part)

    # Cut079: cut Cylinder070
    add(cylinder070_2.part, mode=Mode.SUBTRACT)


with BuildPart() as cabeza:
    # Box067 → Box067 (new body)
    with BuildSketch(Plane(origin=(4, 4, 9), x_dir=(1, 0, 0), z_dir=(0, 0, 1))):
        with Locations((7.5, 2.5)):
            Rectangle(BOX067_W, BOX067_H)
    extrude(amount=BOX067_DEPTH)

    # Fusion021: union Cut079
    add(cut079_1.part)

    # Cut080: cut Cylinder069
    add(cylinder069_2.part, mode=Mode.SUBTRACT)

    # Cut081: cut Cube067
    add(cube067_2.part, mode=Mode.SUBTRACT)

    # Cut082: cut Cylinder071
    add(cylinder071_2.part, mode=Mode.SUBTRACT)

    # Cut083: cut Cylinder072
    add(cylinder072_2.part, mode=Mode.SUBTRACT)

    # Fusion022: union Cut084, Cube071
    add(cut084.part)
    add(cube071.part)


solid = cabeza.part
